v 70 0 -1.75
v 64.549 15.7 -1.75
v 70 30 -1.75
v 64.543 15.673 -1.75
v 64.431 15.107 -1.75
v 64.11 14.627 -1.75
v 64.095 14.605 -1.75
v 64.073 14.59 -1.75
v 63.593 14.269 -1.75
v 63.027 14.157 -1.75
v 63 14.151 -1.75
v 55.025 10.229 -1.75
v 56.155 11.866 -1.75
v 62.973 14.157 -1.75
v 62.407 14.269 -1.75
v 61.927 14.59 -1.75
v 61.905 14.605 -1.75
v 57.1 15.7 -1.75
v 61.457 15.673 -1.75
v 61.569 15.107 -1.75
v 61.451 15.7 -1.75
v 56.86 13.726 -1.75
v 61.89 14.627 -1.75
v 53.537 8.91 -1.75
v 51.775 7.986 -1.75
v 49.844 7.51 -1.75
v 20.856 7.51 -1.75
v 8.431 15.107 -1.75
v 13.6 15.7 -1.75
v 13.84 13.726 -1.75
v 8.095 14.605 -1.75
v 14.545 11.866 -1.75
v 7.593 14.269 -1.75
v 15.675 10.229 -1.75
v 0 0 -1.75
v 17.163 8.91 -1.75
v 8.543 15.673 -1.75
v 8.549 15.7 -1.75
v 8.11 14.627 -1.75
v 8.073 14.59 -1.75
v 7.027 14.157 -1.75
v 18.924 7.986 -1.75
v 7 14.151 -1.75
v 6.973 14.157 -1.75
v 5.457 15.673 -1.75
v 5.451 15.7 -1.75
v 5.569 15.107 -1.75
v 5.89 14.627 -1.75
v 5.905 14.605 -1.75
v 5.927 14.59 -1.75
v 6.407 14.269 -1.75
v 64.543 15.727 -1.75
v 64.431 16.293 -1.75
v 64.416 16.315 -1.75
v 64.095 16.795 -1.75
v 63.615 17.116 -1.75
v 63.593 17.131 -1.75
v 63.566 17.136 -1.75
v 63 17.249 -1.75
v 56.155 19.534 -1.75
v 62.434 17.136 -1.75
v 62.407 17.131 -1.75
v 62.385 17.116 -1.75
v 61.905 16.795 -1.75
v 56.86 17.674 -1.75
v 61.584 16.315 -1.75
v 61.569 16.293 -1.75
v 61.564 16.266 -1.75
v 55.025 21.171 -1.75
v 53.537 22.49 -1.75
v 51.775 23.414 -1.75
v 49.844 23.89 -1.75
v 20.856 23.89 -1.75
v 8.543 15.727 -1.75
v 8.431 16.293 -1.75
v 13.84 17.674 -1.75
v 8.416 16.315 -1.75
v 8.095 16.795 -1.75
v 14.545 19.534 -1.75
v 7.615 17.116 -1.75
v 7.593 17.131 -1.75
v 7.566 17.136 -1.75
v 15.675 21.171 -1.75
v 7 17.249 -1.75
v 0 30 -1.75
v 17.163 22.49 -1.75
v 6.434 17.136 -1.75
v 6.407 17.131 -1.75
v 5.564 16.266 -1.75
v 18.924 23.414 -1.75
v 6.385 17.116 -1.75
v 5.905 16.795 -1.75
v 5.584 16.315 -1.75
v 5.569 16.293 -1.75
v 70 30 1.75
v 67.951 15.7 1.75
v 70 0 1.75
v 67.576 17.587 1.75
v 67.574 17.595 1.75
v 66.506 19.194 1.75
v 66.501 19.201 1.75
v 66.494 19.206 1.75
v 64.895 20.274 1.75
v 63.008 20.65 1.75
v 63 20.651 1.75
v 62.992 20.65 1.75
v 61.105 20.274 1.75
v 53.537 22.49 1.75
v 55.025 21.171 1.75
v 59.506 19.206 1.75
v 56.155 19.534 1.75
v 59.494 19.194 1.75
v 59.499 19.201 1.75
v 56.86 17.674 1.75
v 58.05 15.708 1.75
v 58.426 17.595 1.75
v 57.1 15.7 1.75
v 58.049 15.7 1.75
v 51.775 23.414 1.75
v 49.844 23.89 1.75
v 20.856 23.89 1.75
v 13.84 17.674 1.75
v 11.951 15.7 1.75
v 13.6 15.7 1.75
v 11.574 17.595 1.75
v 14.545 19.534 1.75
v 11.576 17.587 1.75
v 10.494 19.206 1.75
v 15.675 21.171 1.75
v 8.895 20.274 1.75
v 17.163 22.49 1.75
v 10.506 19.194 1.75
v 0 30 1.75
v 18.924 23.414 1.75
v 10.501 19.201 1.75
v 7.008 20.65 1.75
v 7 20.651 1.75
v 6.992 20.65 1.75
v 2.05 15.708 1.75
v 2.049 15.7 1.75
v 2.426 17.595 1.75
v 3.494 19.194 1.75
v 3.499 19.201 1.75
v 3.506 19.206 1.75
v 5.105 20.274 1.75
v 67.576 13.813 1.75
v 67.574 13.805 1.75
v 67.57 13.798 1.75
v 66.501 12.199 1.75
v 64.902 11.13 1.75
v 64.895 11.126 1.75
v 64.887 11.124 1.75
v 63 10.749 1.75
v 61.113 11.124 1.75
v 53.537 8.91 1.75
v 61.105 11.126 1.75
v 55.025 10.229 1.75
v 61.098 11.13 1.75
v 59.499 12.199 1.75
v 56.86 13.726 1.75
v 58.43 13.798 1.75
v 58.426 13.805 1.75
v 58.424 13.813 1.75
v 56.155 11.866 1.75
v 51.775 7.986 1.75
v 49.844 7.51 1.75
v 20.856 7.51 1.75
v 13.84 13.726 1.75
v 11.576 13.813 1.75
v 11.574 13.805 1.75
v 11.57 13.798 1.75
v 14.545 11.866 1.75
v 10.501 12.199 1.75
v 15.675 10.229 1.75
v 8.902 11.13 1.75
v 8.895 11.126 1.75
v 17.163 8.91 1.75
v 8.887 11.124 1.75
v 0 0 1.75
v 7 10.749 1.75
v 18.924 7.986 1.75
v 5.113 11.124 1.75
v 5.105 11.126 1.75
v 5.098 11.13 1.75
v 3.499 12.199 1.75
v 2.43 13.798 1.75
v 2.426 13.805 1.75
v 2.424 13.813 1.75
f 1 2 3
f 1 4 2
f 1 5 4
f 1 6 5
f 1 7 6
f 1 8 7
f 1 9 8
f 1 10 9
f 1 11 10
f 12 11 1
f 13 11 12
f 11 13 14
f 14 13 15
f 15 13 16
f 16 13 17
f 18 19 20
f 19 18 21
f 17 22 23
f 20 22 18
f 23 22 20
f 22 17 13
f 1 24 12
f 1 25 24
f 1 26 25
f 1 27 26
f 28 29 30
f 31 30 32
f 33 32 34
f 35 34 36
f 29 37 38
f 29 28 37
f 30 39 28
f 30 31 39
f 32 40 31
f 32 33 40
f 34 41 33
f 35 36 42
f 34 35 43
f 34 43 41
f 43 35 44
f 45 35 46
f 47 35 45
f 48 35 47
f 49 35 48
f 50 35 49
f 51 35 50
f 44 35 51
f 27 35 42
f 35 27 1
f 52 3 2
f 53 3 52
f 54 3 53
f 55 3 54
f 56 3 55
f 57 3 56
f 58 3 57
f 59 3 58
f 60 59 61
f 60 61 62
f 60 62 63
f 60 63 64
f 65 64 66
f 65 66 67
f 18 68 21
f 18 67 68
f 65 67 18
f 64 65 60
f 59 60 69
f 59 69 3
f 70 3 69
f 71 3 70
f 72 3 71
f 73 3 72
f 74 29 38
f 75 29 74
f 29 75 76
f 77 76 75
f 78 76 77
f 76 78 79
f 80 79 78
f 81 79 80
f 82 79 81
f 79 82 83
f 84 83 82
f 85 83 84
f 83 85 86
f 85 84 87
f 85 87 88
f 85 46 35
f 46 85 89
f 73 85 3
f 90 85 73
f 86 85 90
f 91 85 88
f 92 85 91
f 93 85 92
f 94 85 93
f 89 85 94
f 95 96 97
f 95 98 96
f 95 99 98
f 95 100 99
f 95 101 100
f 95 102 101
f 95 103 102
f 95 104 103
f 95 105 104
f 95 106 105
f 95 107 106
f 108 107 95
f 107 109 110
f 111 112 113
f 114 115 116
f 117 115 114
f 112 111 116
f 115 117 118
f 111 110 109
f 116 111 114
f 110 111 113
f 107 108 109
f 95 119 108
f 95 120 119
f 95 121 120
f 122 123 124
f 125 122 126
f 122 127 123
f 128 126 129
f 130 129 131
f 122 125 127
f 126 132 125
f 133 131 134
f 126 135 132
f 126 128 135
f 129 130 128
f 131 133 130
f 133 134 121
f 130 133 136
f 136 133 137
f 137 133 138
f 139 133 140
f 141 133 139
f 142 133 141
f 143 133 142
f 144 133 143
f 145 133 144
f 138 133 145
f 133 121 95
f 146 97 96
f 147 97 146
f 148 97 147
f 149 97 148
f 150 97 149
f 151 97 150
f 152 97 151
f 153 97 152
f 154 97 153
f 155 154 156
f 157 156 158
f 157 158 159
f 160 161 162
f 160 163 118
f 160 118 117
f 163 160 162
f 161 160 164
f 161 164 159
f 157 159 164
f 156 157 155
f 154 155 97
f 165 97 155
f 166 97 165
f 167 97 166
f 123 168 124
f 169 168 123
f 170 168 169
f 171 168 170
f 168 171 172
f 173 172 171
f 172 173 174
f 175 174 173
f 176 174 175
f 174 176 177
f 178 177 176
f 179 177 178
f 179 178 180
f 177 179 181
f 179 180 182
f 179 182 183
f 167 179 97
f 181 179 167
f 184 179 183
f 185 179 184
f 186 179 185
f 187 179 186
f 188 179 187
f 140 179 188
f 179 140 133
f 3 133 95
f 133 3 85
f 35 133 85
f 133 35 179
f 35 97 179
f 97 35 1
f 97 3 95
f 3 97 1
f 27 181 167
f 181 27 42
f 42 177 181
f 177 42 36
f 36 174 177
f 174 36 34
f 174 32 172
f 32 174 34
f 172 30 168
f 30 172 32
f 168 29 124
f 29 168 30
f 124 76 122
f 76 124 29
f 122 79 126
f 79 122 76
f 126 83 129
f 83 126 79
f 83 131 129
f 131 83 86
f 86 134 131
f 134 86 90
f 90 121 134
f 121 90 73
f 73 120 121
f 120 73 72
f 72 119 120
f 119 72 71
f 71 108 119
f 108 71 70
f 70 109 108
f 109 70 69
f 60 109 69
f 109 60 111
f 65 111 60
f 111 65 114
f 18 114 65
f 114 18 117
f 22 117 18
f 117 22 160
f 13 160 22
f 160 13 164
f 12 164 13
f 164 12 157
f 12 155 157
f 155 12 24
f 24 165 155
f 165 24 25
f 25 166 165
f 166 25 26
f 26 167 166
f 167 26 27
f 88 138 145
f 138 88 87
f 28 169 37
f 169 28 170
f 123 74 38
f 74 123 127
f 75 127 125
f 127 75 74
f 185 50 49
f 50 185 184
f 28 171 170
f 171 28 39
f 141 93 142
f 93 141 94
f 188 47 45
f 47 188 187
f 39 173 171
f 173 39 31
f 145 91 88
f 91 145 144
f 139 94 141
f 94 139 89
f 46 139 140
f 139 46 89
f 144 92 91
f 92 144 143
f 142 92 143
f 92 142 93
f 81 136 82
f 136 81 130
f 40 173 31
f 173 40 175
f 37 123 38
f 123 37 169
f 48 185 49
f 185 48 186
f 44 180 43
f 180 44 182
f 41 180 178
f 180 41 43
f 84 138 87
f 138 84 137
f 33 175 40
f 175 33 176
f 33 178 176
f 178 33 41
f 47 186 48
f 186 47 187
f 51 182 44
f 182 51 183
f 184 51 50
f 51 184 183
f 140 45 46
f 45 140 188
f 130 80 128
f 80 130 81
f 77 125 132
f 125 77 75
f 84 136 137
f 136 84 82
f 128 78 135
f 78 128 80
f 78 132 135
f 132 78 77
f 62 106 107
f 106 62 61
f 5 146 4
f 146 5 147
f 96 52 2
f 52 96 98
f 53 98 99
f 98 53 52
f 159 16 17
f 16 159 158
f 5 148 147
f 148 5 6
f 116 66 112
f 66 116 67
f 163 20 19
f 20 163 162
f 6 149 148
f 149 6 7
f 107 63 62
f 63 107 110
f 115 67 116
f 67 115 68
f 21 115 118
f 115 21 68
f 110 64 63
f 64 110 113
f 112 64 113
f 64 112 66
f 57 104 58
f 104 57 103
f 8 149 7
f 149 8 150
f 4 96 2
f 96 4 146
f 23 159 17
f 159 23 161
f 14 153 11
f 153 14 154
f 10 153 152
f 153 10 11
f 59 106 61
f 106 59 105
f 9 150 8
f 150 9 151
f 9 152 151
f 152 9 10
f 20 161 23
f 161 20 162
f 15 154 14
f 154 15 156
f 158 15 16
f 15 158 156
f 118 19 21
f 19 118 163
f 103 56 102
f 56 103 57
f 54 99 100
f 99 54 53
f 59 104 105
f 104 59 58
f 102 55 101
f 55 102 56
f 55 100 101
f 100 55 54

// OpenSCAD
length_plate = 70;
width_plate = 30;

d_big_hole = 16.5;

module hole() {
    cylinder(h=3.6, r1=1.5, r2=5, center=true);
};


difference() {
    linear_extrude(height = 3.5, center = true, convexity = 10, twist = 0) {
        difference() {
            square(size = [length_plate, width_plate]);
            translate([14, 15.7, 0]) {
                hull() {
                    translate([34.85,0,0]) {
                        circle(d_big_hole/2);
                    };
                    translate([7.85, 0, 0]) {
                        circle(d_big_hole/2);
                    };
                };
            };
        };
    };
    
    translate([7, 15.7, 0]) {
        hole();
    };
    
    translate([63, 15.7, 0]) {
        hole();
    };
};
